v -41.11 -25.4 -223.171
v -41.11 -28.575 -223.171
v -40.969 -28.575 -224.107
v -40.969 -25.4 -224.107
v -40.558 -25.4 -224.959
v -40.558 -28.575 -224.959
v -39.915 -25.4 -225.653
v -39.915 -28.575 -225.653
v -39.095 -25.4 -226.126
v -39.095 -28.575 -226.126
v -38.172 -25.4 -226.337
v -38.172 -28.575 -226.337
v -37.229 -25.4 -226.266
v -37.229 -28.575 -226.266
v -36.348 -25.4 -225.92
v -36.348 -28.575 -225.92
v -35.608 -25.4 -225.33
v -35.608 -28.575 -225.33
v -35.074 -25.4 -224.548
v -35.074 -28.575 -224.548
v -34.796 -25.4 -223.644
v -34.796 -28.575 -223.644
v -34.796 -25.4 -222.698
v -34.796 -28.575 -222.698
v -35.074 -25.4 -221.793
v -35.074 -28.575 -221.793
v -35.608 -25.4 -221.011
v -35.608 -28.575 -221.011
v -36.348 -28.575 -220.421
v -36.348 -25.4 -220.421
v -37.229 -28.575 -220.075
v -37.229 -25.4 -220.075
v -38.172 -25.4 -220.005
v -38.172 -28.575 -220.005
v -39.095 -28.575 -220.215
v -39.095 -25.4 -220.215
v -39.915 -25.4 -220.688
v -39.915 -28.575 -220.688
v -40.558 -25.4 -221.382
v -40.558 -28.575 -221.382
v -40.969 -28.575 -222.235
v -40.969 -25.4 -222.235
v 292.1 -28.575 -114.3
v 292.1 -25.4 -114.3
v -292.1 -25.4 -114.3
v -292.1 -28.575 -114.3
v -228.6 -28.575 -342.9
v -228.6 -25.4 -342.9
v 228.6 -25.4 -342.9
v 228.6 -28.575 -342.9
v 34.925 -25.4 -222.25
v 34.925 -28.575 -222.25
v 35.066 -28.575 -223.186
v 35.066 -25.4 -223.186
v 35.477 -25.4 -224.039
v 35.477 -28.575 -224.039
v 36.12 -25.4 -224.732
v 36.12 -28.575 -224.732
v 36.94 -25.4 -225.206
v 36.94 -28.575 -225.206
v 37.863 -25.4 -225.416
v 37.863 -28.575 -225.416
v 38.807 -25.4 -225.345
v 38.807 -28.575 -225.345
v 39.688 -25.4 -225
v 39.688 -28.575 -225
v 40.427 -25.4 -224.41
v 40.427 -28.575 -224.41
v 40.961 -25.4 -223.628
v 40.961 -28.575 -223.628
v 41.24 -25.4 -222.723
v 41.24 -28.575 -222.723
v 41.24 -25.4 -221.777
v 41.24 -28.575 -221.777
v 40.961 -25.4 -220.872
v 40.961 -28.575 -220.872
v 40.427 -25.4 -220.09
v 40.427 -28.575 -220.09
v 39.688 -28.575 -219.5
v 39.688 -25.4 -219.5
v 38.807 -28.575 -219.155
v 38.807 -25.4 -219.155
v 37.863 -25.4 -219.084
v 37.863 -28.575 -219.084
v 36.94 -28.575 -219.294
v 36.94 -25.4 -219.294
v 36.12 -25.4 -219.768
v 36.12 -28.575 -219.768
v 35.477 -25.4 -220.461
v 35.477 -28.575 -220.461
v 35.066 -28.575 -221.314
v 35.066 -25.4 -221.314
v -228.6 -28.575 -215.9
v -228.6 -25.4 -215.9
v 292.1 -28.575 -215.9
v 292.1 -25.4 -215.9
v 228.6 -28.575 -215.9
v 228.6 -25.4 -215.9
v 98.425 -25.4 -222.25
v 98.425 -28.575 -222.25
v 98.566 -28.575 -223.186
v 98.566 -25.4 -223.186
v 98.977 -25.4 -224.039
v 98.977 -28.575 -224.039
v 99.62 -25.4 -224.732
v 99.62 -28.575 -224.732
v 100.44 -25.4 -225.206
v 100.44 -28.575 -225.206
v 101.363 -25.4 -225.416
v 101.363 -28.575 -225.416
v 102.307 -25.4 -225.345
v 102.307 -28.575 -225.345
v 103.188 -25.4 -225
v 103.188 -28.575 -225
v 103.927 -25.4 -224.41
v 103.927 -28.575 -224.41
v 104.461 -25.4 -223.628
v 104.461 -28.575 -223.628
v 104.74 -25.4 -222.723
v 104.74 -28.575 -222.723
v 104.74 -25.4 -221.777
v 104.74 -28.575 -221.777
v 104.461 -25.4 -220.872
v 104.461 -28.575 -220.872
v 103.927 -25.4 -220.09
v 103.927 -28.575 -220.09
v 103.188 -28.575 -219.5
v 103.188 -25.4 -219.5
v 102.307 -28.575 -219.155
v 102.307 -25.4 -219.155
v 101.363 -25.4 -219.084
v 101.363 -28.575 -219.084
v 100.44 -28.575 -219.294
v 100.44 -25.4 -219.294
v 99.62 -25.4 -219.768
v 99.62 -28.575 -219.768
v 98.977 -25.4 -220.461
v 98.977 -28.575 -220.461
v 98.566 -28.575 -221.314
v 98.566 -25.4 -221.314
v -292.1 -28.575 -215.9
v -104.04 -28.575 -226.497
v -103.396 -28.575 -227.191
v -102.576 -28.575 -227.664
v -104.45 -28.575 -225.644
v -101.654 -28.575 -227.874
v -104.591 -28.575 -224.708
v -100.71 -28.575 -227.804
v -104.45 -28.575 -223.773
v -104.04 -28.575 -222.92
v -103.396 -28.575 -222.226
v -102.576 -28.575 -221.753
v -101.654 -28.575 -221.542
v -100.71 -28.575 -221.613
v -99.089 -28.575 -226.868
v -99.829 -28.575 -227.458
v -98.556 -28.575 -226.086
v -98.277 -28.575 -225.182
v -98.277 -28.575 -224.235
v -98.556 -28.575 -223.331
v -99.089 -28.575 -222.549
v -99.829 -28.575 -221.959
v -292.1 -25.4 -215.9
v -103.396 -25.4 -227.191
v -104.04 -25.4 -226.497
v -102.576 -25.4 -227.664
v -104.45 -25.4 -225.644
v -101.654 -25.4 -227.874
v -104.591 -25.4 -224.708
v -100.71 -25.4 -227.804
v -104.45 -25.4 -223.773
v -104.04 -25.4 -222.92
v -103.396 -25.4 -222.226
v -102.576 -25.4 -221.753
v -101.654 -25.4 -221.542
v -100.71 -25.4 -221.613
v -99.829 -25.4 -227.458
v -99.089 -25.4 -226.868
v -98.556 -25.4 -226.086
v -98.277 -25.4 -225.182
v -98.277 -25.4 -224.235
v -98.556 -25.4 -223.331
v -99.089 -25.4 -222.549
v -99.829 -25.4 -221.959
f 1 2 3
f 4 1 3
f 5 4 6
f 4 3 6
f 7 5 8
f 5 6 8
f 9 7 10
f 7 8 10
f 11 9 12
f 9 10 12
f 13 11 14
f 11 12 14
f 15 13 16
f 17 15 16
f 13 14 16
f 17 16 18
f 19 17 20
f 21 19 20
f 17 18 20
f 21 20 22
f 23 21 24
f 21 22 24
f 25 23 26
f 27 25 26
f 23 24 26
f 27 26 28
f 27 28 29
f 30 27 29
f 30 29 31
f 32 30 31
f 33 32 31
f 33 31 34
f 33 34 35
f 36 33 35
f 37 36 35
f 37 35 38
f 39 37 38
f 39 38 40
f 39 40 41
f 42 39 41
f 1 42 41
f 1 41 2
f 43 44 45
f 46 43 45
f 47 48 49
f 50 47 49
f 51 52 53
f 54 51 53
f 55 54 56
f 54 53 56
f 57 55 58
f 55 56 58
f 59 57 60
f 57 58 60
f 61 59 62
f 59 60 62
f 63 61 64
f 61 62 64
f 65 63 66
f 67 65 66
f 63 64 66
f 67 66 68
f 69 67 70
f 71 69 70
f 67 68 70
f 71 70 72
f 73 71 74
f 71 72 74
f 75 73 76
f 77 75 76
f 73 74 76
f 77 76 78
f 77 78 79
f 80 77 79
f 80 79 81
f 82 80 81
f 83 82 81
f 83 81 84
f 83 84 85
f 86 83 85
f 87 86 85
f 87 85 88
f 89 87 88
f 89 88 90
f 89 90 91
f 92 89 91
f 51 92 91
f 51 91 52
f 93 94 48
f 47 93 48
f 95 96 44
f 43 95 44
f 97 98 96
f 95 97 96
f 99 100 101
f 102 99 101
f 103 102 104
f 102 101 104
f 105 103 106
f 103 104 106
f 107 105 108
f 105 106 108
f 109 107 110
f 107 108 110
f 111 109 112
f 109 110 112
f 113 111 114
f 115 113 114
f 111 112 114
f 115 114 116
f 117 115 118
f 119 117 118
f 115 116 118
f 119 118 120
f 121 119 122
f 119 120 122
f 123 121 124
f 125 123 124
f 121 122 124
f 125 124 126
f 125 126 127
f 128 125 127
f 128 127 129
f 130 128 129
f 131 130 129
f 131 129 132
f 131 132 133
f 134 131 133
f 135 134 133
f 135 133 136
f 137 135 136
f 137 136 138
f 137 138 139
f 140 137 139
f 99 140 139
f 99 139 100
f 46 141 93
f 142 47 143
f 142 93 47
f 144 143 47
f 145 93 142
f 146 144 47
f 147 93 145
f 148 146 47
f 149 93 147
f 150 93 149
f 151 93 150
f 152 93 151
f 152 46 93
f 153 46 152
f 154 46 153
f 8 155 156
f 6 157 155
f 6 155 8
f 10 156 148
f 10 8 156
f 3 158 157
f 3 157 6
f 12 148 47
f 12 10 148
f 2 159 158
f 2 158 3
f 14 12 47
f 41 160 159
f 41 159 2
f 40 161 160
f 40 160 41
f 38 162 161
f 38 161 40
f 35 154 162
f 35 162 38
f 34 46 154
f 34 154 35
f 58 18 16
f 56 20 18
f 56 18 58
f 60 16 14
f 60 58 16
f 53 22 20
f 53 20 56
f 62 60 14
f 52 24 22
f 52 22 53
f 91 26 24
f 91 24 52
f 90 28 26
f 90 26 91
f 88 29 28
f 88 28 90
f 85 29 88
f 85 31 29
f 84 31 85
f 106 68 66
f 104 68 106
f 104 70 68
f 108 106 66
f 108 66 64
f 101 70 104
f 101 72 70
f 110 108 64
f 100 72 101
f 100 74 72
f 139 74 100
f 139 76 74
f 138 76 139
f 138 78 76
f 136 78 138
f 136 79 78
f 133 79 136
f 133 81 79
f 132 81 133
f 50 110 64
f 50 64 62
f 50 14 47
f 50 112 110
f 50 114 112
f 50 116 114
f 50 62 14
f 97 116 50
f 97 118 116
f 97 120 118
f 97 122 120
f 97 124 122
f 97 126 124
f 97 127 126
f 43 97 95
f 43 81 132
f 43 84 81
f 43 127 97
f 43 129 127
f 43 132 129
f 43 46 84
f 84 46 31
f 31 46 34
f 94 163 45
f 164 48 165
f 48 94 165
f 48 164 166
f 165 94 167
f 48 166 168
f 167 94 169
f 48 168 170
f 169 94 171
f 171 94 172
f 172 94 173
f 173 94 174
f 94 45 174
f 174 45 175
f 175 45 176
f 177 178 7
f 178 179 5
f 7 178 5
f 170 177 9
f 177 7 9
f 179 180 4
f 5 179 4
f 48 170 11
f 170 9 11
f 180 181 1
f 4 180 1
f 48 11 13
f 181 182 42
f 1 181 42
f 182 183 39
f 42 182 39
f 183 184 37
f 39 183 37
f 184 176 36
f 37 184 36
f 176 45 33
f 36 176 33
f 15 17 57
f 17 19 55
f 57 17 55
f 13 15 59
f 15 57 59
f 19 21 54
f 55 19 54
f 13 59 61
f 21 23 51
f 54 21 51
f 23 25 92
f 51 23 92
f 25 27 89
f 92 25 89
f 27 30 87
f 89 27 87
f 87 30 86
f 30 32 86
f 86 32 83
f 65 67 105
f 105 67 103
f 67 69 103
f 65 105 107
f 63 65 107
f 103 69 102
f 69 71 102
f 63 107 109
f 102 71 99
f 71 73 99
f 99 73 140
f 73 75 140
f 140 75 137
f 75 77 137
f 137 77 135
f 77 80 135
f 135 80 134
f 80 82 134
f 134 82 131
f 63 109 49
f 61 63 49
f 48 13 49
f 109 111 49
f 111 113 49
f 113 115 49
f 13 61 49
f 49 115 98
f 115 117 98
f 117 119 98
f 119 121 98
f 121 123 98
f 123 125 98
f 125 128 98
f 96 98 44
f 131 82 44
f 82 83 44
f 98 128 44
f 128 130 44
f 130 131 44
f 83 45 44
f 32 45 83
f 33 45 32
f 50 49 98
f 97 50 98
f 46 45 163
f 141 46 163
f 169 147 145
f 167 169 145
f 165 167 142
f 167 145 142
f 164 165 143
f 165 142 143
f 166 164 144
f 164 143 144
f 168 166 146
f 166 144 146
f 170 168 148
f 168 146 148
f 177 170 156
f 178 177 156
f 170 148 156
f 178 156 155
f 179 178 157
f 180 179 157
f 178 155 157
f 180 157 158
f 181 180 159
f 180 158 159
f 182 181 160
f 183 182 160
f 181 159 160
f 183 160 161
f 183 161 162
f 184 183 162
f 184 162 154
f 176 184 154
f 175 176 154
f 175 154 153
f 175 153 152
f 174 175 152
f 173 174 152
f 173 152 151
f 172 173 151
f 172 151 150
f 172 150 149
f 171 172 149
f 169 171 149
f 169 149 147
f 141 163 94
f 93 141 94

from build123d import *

# Parameters (mm, degrees)
BOSS_EXTRUDE1_DEPTH         = 3.175
F_1_4_0_25_DIAMETER_HOLE1_D = 6.35


with BuildPart() as part:
    # Sketch1 → Boss-Extrude1 (new body)
    with BuildSketch(Plane.XZ.offset(25.4)):
        Polygon((292.1, -215.9), (292.1, -114.3), (0, -114.3), (0, -342.9), (228.6, -342.9), (228.6, -215.9), align=None)
        Polygon((0, -342.9), (0, -114.3), (-292.1, -114.3), (-292.1, -215.9), (-228.6, -215.9), (-228.6, -342.9), align=None)
    extrude(amount=BOSS_EXTRUDE1_DEPTH)

    # 1/4 (0.25) Diameter Hole1 (through all)
    with Locations(Plane(origin=(0, -25.4, 0), x_dir=(1, 0, 0), z_dir=(0, 1, 0))):
        with Locations((-37.935064693, 223.17071982), (-101.416445229, 224.708356097), (38.1, 222.25), (101.6, 222.25)):
            Hole(F_1_4_0_25_DIAMETER_HOLE1_D / 2)


solid = part.part
